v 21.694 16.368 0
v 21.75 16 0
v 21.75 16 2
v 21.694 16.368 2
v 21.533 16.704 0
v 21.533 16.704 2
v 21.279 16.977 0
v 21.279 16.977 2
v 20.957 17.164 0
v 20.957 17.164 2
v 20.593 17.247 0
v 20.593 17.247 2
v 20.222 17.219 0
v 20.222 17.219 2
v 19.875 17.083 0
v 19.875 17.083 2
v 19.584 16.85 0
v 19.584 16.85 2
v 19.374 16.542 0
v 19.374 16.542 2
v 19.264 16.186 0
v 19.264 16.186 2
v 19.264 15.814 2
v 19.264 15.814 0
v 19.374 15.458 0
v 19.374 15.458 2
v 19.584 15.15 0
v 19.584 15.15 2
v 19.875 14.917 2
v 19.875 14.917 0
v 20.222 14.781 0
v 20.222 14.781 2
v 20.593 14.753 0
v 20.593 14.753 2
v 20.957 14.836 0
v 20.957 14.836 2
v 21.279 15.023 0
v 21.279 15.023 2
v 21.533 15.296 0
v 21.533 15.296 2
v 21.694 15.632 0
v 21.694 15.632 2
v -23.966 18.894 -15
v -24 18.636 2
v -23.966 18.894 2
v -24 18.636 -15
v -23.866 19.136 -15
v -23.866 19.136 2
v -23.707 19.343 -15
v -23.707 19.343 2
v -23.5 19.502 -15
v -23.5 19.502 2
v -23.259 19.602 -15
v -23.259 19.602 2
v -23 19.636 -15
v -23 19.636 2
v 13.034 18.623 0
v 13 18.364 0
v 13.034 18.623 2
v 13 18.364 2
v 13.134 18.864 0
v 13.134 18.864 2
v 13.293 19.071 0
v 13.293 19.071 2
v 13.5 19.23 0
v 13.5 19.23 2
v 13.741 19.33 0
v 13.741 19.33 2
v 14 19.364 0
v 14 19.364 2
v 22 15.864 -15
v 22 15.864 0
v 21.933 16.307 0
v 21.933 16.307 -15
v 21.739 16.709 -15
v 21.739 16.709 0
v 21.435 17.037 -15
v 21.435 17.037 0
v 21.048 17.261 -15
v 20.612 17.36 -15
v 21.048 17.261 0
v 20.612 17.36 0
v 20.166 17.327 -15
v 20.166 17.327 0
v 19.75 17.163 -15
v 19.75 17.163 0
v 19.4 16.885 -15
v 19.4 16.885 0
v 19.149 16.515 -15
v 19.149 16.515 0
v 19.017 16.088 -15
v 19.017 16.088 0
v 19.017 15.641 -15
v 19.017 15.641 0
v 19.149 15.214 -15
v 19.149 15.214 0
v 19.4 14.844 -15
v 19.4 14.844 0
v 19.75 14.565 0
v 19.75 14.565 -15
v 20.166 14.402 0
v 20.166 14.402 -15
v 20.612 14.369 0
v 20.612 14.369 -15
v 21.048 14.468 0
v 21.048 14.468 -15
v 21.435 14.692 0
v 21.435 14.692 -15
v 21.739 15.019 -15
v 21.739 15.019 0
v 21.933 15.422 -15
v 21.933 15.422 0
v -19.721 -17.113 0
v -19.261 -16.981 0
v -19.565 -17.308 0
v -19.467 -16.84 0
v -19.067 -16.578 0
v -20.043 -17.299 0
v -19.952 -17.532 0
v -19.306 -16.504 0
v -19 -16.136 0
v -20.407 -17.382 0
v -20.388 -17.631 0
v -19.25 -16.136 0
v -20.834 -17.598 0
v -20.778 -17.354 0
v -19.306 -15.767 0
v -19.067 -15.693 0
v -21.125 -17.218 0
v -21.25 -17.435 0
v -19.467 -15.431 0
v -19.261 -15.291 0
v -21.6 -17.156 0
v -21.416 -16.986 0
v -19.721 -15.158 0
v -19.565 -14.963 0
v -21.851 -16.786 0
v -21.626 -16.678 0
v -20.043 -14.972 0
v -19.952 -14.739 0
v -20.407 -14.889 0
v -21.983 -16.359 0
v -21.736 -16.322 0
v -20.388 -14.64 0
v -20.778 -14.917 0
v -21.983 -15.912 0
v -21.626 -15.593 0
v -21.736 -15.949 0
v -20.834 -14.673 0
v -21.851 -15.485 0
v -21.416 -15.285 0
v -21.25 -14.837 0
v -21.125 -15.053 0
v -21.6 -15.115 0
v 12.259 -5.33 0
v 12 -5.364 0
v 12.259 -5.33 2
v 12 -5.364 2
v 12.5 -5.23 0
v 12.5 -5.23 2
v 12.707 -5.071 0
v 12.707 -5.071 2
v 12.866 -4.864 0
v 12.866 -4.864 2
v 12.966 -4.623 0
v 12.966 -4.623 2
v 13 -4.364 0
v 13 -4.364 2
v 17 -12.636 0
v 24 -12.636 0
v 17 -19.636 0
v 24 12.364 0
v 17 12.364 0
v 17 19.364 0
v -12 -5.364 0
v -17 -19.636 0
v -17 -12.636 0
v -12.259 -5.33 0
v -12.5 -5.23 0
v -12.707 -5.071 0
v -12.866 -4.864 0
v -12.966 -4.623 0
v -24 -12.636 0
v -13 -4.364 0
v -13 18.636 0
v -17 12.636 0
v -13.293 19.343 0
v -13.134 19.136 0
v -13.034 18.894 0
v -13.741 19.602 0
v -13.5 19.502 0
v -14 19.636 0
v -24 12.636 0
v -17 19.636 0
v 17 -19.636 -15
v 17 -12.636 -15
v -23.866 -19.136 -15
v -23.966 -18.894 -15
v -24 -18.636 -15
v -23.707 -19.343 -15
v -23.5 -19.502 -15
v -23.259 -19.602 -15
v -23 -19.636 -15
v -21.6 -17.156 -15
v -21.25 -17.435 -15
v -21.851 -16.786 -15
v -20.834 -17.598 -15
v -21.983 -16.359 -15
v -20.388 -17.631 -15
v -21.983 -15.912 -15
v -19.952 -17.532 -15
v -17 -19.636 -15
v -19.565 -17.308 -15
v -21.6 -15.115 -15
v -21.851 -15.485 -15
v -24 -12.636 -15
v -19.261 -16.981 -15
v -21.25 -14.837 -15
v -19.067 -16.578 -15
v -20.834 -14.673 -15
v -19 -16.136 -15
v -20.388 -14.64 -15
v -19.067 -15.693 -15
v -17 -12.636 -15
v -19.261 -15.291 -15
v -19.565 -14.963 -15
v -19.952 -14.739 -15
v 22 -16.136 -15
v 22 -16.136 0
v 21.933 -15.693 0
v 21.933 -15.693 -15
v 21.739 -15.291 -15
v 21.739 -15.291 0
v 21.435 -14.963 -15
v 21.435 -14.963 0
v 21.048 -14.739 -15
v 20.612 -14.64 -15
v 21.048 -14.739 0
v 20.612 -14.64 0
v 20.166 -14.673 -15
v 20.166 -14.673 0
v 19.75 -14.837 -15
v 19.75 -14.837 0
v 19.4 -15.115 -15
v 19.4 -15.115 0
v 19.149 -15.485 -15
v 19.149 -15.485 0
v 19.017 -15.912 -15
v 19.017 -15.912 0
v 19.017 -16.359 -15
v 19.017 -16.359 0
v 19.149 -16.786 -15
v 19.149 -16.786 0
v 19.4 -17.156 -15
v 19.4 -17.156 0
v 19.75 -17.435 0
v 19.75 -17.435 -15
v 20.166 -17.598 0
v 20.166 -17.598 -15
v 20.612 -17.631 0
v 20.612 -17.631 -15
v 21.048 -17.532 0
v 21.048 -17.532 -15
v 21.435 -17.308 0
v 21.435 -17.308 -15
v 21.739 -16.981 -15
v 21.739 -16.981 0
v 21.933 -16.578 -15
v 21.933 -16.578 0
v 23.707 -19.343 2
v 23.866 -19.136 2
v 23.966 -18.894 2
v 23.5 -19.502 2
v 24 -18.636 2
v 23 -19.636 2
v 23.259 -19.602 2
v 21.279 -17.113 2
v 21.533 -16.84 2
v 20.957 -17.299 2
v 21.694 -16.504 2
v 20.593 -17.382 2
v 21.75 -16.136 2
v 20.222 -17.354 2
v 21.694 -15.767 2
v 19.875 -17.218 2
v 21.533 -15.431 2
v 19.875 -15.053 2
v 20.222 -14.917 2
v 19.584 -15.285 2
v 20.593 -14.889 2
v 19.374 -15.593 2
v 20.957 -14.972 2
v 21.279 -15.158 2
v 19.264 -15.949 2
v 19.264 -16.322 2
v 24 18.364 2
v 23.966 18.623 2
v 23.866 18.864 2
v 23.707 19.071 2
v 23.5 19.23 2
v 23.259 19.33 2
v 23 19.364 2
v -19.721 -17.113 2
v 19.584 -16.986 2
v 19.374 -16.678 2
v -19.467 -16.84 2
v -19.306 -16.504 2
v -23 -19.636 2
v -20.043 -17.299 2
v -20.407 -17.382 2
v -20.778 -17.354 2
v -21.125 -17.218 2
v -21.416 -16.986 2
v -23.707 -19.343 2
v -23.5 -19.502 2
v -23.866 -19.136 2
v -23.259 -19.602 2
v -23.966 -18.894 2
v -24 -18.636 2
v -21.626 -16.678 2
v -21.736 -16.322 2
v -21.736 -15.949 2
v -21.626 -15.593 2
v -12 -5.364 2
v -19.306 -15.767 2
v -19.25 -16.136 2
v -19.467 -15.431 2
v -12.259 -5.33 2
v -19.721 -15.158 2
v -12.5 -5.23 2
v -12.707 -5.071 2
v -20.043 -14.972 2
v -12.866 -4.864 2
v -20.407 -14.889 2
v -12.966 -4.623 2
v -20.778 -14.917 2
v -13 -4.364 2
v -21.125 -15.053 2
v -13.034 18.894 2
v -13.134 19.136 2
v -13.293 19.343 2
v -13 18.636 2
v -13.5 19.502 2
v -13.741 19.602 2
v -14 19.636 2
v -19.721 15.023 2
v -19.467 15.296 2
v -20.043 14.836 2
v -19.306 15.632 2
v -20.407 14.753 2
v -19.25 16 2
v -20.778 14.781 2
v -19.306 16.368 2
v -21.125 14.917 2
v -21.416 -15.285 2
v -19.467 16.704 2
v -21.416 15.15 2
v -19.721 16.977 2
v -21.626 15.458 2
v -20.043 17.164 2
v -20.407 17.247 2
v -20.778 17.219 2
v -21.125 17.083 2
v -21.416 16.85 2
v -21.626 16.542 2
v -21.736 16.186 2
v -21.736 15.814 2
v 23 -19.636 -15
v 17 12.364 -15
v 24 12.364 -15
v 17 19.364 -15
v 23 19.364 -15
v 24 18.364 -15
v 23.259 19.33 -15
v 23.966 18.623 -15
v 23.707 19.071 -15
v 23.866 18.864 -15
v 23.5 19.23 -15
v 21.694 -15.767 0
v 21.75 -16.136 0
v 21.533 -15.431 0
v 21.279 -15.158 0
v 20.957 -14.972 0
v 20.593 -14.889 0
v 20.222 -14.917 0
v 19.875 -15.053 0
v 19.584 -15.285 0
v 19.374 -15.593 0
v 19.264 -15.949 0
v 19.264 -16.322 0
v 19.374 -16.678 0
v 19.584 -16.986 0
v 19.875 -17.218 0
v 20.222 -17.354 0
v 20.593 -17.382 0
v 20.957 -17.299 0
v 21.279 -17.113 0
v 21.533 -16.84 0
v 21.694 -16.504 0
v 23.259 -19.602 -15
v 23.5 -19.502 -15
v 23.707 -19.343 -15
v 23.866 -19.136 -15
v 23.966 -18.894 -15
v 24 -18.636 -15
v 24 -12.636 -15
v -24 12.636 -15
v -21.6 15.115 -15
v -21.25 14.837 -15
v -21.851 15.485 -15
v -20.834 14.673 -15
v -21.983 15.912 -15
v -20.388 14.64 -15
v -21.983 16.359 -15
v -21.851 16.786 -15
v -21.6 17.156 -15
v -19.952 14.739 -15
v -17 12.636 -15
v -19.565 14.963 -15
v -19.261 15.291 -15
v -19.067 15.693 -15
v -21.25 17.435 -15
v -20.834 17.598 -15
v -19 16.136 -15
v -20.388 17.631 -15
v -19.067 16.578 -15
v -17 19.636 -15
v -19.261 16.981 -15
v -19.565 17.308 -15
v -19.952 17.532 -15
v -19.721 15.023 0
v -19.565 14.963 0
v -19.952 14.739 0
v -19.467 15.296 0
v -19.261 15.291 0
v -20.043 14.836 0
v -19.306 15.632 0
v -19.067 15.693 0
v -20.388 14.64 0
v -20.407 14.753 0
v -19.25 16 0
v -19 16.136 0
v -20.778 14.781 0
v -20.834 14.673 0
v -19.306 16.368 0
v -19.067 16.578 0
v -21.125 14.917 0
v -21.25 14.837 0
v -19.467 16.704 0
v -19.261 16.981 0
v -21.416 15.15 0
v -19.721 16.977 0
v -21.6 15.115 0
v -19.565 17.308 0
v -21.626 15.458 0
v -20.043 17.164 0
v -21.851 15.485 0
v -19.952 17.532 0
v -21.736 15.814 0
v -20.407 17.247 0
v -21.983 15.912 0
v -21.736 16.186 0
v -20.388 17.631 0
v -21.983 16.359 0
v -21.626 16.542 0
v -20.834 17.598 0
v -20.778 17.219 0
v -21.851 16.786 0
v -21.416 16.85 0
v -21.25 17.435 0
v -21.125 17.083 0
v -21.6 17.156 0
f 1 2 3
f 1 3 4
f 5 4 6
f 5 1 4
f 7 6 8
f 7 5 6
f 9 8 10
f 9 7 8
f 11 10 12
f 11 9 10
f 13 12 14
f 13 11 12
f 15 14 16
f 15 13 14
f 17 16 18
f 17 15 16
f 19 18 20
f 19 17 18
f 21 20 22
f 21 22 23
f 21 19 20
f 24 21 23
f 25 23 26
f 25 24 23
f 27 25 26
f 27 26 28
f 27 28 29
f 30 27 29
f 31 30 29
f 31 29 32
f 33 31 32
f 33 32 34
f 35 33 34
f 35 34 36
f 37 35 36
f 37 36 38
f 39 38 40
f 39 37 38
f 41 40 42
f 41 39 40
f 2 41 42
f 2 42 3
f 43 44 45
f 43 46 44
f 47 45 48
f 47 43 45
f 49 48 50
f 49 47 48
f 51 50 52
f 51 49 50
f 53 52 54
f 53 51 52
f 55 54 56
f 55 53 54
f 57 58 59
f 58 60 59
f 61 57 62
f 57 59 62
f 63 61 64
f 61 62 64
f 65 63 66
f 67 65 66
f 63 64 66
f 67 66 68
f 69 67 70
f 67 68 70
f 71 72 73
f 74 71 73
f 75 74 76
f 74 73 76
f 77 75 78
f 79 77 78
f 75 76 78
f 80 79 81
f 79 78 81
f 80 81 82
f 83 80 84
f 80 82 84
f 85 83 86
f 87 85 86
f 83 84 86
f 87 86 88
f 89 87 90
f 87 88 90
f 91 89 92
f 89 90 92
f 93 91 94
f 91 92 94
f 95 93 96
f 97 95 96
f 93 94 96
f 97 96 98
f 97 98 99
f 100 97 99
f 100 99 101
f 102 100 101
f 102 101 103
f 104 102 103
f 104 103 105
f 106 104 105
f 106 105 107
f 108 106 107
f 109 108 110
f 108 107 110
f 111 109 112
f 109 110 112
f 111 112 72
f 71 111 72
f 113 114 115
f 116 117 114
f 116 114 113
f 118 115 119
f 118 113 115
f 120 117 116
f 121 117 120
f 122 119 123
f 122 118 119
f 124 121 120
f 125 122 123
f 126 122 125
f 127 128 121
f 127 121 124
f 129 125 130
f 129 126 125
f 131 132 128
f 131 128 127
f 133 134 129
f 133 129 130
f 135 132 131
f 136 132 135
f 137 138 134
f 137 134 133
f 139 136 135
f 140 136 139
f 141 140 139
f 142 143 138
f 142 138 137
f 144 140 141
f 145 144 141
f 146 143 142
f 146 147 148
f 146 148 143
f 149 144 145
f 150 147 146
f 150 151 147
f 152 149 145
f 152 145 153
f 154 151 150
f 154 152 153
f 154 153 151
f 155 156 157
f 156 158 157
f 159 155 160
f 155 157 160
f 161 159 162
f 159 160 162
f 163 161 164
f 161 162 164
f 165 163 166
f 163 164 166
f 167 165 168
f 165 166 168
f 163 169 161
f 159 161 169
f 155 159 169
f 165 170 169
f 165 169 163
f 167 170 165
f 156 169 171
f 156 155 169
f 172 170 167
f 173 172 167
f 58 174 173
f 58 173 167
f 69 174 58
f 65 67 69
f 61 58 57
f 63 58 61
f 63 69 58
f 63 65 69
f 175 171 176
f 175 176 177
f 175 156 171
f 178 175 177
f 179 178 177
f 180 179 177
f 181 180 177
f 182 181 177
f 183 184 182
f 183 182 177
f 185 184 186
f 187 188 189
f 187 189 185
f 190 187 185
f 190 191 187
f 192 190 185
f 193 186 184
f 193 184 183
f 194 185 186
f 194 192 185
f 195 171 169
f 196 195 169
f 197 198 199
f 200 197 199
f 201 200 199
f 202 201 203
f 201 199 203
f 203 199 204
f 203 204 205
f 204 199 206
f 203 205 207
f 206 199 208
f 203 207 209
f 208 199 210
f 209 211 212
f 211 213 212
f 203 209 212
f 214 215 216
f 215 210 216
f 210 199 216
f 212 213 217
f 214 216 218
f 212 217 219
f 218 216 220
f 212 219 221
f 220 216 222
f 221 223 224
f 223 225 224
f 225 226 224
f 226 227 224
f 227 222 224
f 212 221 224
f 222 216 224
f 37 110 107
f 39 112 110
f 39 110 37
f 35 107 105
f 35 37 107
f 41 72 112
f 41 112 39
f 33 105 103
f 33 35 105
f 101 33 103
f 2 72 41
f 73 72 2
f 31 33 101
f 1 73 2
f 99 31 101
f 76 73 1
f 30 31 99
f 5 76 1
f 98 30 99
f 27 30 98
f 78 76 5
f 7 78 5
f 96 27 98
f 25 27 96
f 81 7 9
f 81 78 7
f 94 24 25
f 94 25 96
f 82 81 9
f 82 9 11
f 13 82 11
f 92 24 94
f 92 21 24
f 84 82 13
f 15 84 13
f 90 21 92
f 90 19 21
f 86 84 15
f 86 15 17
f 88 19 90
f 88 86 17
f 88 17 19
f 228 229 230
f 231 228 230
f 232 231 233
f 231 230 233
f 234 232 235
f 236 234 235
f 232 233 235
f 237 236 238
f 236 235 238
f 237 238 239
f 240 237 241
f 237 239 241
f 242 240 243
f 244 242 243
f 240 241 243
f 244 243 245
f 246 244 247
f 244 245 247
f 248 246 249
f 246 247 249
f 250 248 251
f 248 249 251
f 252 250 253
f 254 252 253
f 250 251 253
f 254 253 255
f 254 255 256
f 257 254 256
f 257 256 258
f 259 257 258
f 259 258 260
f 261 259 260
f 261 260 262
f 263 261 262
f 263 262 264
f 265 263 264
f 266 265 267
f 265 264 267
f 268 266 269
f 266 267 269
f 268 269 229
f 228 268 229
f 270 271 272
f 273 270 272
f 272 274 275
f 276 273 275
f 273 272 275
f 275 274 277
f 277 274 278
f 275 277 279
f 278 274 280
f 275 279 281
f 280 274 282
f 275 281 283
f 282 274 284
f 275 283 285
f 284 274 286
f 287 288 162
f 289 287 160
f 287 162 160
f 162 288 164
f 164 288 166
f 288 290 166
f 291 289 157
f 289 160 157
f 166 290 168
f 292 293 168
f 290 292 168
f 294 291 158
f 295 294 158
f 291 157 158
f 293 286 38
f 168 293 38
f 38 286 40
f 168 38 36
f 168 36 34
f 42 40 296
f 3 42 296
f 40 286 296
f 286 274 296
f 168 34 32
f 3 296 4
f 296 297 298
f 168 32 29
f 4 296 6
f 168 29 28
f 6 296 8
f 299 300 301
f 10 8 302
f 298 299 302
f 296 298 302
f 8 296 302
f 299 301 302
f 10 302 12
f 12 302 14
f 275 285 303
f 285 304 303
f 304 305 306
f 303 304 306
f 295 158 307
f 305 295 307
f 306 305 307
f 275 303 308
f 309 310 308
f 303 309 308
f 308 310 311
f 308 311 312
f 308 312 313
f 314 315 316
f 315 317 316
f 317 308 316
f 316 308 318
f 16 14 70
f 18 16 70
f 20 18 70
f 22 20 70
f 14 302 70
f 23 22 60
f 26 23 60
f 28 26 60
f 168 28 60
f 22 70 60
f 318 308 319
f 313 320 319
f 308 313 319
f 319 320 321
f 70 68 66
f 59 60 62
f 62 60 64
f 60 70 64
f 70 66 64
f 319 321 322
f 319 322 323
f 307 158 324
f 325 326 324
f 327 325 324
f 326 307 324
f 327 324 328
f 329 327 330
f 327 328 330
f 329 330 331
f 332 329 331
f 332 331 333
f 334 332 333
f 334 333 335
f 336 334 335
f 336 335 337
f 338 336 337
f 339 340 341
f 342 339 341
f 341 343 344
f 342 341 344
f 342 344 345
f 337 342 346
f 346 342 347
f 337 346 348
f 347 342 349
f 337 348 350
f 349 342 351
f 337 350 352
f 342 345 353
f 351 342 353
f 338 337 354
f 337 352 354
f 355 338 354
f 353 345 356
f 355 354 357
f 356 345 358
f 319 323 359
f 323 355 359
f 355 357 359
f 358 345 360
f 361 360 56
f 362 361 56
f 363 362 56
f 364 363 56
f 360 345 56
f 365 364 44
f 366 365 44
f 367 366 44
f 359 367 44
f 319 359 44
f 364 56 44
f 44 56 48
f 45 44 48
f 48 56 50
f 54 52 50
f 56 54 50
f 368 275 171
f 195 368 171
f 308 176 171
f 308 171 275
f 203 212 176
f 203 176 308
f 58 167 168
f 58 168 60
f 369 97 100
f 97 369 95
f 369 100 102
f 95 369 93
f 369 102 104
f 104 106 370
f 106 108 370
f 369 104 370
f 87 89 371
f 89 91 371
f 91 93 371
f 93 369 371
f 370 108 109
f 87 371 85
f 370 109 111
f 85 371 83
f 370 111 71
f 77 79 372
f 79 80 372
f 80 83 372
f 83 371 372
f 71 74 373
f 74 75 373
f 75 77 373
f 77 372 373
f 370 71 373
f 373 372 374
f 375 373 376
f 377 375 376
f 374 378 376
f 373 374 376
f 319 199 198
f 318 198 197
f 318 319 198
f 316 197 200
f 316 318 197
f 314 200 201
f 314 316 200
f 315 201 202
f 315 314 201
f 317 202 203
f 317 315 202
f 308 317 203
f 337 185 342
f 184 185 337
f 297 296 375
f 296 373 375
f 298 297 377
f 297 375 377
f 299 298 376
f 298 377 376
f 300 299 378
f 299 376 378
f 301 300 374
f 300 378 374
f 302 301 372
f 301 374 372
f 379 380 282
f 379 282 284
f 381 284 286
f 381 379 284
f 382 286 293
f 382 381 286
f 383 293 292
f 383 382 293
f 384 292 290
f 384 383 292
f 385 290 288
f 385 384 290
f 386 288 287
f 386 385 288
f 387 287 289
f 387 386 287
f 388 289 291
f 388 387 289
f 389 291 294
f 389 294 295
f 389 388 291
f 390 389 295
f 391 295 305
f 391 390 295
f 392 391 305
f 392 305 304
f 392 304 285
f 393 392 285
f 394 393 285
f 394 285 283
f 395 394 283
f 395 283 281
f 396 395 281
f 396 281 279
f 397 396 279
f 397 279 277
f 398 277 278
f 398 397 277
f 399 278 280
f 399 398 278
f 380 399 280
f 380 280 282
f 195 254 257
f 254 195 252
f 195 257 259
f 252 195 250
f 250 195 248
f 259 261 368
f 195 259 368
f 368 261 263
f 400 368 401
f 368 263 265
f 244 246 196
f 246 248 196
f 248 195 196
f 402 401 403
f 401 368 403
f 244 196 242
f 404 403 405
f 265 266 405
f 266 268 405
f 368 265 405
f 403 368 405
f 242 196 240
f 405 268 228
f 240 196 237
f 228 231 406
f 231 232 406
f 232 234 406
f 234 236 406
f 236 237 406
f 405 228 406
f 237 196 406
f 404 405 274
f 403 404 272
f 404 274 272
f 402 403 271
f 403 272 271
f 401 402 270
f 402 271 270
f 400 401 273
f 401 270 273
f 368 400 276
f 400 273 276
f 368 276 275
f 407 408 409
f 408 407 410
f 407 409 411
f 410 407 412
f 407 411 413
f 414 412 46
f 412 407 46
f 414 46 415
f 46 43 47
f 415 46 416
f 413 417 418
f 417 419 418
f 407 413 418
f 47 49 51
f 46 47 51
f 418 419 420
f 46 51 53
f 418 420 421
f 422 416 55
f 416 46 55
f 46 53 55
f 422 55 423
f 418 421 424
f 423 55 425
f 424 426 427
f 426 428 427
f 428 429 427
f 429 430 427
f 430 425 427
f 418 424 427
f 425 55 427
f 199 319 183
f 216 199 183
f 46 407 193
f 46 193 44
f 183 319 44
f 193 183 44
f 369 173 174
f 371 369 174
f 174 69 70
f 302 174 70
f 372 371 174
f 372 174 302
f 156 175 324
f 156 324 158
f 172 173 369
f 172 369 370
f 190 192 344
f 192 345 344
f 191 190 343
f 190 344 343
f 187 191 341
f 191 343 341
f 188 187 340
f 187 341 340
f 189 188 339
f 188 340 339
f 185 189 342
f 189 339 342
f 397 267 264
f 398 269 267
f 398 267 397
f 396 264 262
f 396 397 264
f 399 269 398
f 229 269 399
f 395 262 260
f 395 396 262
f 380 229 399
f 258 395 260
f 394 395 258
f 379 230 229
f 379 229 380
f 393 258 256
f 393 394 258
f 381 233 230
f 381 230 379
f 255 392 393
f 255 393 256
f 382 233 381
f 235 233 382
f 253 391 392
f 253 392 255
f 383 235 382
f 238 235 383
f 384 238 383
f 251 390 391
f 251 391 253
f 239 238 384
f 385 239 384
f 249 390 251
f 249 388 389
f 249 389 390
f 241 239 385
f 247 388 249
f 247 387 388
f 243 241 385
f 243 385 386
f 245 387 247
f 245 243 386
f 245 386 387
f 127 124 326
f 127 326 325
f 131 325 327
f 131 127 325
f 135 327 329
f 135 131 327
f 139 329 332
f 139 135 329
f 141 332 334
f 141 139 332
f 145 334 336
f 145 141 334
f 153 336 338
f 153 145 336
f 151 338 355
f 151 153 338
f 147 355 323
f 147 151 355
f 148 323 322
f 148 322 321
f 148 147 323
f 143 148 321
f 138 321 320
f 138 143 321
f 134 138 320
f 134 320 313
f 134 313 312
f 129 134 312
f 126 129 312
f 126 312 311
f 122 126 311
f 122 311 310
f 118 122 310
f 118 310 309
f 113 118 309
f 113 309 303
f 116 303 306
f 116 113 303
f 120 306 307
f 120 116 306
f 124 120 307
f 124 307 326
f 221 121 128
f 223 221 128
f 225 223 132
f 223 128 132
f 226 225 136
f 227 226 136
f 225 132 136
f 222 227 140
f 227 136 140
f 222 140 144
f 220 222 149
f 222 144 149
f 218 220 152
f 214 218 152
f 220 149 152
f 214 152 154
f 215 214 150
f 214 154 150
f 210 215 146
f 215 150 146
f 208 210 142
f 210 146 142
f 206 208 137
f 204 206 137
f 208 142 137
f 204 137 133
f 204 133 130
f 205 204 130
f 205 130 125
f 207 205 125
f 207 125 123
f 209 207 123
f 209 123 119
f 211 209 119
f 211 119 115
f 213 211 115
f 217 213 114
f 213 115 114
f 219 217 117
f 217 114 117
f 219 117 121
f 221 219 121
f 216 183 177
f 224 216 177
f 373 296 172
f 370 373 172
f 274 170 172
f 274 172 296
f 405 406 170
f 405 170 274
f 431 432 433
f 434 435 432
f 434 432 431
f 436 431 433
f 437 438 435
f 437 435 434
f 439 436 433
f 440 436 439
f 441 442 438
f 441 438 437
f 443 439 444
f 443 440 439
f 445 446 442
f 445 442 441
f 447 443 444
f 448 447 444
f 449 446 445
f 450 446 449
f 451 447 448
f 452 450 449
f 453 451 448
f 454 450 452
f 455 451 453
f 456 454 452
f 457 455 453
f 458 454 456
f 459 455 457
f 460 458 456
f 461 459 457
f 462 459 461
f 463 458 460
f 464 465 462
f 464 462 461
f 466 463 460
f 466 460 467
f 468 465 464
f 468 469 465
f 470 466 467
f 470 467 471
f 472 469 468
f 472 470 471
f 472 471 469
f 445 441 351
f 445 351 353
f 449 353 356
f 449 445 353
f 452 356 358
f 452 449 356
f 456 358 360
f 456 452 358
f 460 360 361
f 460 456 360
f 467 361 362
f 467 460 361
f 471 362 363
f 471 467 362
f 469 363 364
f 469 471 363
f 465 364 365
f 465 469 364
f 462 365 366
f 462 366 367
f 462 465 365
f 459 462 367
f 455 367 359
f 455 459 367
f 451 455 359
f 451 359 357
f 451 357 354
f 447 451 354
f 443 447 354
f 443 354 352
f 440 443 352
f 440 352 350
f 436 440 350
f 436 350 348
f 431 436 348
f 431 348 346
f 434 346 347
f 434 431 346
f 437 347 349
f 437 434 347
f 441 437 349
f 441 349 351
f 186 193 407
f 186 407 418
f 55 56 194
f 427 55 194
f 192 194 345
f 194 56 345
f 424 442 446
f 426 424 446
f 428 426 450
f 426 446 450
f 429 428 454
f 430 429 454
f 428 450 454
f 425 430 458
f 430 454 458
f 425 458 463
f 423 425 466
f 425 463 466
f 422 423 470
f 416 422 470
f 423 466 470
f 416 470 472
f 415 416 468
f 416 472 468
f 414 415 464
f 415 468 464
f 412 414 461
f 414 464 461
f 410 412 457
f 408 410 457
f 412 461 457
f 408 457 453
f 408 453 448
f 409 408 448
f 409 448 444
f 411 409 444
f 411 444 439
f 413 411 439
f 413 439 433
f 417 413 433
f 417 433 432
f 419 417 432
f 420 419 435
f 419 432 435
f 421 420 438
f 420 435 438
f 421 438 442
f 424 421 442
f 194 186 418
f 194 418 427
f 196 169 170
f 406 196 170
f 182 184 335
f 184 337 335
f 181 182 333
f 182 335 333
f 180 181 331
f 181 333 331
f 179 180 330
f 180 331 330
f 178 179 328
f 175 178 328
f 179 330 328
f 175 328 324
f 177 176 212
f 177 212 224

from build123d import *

# Parameters (mm, degrees)
SKETCH_R     = 1.25
PAD_DEPTH    = 2
SKETCH001_W  = 7
SKETCH001_H  = 7
SKETCH001_R  = 1.5
PAD001_DEPTH = 15
FILLET_R     = 1
FILLET001_R  = 1
FILLET002_R  = 1
FILLET003_R  = 1
FILLET004_R  = 1
FILLET005_R  = 1
FILLET006_R  = 1
FILLET007_R  = 1


with BuildPart() as part:
    # Sketch → Pad (new body)
    with BuildSketch(Plane.XY):
        Polygon((24, 19.364391), (24, -19.635609), (-24, -19.635609), (-24, 19.635609), (-13, 19.635609), (-13, -5.364391), (13, -5.364391), (13, 19.364391), align=None)
        with Locations((-20.5, 16)):
            Circle(SKETCH_R, mode=Mode.SUBTRACT)
        with Locations((20.5, -16.135609)):
            Circle(SKETCH_R, mode=Mode.SUBTRACT)
        with Locations((20.5, 16)):
            Circle(SKETCH_R, mode=Mode.SUBTRACT)
        with Locations((-20.5, -16.135609)):
            Circle(SKETCH_R, mode=Mode.SUBTRACT)
    extrude(amount=PAD_DEPTH)

    # Sketch001 → Pad001 (join)
    with BuildSketch(Plane.XY):
        with Locations((-20.5, 16.135609)):
            Rectangle(SKETCH001_W, SKETCH001_H)
        with Locations((-20.5, 16.135609)):
            Circle(SKETCH001_R, mode=Mode.SUBTRACT)
        with Locations((20.5, 15.864391)):
            Rectangle(SKETCH001_W, SKETCH001_H)
        with Locations((20.5, 15.864391)):
            Circle(SKETCH001_R, mode=Mode.SUBTRACT)
        with Locations((-20.5, -16.135609)):
            Rectangle(SKETCH001_W, SKETCH001_H)
        with Locations((-20.5, -16.135609)):
            Circle(SKETCH001_R, mode=Mode.SUBTRACT)
        with Locations((20.5, -16.135609)):
            Rectangle(SKETCH001_W, SKETCH001_H)
        with Locations((20.5, -16.135609)):
            Circle(SKETCH001_R, mode=Mode.SUBTRACT)
    extrude(amount=-PAD001_DEPTH)

    # Fillet
    fillet_edges = [part.edges().sort_by_distance(p)[0] for p in [
        (24, -19.635609, -7.5),
        (24, -19.635609, 1),
    ]]
    fillet(fillet_edges, radius=FILLET_R)

    # Fillet001
    fillet001_edges = [part.edges().sort_by_distance(p)[0] for p in [
        (24, 19.364391, 1),
        (24, 19.364391, -7.5),
    ]]
    fillet(fillet001_edges, radius=FILLET001_R)

    # Fillet002
    fillet002_edges = [part.edges().sort_by_distance(p)[0] for p in [
        (-24, 19.635609, 1),
        (-24, 19.635609, -7.5),
    ]]
    fillet(fillet002_edges, radius=FILLET002_R)

    # Fillet003
    fillet003_edges = [part.edges().sort_by_distance(p)[0] for p in [
        (-24, -19.635609, -7.5),
        (-24, -19.635609, 1),
    ]]
    fillet(fillet003_edges, radius=FILLET003_R)

    # Fillet004
    fillet004_edges = [part.edges().sort_by_distance(p)[0] for p in [
        (-13, 19.635609, 1),
    ]]
    fillet(fillet004_edges, radius=FILLET004_R)

    # Fillet005
    fillet005_edges = [part.edges().sort_by_distance(p)[0] for p in [
        (-13, -5.364391, 1),
    ]]
    fillet(fillet005_edges, radius=FILLET005_R)

    # Fillet006
    fillet006_edges = [part.edges().sort_by_distance(p)[0] for p in [
        (13, -5.364391, 1),
    ]]
    fillet(fillet006_edges, radius=FILLET006_R)

    # Fillet007
    fillet007_edges = [part.edges().sort_by_distance(p)[0] for p in [
        (13, 19.364391, 1),
    ]]
    fillet(fillet007_edges, radius=FILLET007_R)


solid = part.part
